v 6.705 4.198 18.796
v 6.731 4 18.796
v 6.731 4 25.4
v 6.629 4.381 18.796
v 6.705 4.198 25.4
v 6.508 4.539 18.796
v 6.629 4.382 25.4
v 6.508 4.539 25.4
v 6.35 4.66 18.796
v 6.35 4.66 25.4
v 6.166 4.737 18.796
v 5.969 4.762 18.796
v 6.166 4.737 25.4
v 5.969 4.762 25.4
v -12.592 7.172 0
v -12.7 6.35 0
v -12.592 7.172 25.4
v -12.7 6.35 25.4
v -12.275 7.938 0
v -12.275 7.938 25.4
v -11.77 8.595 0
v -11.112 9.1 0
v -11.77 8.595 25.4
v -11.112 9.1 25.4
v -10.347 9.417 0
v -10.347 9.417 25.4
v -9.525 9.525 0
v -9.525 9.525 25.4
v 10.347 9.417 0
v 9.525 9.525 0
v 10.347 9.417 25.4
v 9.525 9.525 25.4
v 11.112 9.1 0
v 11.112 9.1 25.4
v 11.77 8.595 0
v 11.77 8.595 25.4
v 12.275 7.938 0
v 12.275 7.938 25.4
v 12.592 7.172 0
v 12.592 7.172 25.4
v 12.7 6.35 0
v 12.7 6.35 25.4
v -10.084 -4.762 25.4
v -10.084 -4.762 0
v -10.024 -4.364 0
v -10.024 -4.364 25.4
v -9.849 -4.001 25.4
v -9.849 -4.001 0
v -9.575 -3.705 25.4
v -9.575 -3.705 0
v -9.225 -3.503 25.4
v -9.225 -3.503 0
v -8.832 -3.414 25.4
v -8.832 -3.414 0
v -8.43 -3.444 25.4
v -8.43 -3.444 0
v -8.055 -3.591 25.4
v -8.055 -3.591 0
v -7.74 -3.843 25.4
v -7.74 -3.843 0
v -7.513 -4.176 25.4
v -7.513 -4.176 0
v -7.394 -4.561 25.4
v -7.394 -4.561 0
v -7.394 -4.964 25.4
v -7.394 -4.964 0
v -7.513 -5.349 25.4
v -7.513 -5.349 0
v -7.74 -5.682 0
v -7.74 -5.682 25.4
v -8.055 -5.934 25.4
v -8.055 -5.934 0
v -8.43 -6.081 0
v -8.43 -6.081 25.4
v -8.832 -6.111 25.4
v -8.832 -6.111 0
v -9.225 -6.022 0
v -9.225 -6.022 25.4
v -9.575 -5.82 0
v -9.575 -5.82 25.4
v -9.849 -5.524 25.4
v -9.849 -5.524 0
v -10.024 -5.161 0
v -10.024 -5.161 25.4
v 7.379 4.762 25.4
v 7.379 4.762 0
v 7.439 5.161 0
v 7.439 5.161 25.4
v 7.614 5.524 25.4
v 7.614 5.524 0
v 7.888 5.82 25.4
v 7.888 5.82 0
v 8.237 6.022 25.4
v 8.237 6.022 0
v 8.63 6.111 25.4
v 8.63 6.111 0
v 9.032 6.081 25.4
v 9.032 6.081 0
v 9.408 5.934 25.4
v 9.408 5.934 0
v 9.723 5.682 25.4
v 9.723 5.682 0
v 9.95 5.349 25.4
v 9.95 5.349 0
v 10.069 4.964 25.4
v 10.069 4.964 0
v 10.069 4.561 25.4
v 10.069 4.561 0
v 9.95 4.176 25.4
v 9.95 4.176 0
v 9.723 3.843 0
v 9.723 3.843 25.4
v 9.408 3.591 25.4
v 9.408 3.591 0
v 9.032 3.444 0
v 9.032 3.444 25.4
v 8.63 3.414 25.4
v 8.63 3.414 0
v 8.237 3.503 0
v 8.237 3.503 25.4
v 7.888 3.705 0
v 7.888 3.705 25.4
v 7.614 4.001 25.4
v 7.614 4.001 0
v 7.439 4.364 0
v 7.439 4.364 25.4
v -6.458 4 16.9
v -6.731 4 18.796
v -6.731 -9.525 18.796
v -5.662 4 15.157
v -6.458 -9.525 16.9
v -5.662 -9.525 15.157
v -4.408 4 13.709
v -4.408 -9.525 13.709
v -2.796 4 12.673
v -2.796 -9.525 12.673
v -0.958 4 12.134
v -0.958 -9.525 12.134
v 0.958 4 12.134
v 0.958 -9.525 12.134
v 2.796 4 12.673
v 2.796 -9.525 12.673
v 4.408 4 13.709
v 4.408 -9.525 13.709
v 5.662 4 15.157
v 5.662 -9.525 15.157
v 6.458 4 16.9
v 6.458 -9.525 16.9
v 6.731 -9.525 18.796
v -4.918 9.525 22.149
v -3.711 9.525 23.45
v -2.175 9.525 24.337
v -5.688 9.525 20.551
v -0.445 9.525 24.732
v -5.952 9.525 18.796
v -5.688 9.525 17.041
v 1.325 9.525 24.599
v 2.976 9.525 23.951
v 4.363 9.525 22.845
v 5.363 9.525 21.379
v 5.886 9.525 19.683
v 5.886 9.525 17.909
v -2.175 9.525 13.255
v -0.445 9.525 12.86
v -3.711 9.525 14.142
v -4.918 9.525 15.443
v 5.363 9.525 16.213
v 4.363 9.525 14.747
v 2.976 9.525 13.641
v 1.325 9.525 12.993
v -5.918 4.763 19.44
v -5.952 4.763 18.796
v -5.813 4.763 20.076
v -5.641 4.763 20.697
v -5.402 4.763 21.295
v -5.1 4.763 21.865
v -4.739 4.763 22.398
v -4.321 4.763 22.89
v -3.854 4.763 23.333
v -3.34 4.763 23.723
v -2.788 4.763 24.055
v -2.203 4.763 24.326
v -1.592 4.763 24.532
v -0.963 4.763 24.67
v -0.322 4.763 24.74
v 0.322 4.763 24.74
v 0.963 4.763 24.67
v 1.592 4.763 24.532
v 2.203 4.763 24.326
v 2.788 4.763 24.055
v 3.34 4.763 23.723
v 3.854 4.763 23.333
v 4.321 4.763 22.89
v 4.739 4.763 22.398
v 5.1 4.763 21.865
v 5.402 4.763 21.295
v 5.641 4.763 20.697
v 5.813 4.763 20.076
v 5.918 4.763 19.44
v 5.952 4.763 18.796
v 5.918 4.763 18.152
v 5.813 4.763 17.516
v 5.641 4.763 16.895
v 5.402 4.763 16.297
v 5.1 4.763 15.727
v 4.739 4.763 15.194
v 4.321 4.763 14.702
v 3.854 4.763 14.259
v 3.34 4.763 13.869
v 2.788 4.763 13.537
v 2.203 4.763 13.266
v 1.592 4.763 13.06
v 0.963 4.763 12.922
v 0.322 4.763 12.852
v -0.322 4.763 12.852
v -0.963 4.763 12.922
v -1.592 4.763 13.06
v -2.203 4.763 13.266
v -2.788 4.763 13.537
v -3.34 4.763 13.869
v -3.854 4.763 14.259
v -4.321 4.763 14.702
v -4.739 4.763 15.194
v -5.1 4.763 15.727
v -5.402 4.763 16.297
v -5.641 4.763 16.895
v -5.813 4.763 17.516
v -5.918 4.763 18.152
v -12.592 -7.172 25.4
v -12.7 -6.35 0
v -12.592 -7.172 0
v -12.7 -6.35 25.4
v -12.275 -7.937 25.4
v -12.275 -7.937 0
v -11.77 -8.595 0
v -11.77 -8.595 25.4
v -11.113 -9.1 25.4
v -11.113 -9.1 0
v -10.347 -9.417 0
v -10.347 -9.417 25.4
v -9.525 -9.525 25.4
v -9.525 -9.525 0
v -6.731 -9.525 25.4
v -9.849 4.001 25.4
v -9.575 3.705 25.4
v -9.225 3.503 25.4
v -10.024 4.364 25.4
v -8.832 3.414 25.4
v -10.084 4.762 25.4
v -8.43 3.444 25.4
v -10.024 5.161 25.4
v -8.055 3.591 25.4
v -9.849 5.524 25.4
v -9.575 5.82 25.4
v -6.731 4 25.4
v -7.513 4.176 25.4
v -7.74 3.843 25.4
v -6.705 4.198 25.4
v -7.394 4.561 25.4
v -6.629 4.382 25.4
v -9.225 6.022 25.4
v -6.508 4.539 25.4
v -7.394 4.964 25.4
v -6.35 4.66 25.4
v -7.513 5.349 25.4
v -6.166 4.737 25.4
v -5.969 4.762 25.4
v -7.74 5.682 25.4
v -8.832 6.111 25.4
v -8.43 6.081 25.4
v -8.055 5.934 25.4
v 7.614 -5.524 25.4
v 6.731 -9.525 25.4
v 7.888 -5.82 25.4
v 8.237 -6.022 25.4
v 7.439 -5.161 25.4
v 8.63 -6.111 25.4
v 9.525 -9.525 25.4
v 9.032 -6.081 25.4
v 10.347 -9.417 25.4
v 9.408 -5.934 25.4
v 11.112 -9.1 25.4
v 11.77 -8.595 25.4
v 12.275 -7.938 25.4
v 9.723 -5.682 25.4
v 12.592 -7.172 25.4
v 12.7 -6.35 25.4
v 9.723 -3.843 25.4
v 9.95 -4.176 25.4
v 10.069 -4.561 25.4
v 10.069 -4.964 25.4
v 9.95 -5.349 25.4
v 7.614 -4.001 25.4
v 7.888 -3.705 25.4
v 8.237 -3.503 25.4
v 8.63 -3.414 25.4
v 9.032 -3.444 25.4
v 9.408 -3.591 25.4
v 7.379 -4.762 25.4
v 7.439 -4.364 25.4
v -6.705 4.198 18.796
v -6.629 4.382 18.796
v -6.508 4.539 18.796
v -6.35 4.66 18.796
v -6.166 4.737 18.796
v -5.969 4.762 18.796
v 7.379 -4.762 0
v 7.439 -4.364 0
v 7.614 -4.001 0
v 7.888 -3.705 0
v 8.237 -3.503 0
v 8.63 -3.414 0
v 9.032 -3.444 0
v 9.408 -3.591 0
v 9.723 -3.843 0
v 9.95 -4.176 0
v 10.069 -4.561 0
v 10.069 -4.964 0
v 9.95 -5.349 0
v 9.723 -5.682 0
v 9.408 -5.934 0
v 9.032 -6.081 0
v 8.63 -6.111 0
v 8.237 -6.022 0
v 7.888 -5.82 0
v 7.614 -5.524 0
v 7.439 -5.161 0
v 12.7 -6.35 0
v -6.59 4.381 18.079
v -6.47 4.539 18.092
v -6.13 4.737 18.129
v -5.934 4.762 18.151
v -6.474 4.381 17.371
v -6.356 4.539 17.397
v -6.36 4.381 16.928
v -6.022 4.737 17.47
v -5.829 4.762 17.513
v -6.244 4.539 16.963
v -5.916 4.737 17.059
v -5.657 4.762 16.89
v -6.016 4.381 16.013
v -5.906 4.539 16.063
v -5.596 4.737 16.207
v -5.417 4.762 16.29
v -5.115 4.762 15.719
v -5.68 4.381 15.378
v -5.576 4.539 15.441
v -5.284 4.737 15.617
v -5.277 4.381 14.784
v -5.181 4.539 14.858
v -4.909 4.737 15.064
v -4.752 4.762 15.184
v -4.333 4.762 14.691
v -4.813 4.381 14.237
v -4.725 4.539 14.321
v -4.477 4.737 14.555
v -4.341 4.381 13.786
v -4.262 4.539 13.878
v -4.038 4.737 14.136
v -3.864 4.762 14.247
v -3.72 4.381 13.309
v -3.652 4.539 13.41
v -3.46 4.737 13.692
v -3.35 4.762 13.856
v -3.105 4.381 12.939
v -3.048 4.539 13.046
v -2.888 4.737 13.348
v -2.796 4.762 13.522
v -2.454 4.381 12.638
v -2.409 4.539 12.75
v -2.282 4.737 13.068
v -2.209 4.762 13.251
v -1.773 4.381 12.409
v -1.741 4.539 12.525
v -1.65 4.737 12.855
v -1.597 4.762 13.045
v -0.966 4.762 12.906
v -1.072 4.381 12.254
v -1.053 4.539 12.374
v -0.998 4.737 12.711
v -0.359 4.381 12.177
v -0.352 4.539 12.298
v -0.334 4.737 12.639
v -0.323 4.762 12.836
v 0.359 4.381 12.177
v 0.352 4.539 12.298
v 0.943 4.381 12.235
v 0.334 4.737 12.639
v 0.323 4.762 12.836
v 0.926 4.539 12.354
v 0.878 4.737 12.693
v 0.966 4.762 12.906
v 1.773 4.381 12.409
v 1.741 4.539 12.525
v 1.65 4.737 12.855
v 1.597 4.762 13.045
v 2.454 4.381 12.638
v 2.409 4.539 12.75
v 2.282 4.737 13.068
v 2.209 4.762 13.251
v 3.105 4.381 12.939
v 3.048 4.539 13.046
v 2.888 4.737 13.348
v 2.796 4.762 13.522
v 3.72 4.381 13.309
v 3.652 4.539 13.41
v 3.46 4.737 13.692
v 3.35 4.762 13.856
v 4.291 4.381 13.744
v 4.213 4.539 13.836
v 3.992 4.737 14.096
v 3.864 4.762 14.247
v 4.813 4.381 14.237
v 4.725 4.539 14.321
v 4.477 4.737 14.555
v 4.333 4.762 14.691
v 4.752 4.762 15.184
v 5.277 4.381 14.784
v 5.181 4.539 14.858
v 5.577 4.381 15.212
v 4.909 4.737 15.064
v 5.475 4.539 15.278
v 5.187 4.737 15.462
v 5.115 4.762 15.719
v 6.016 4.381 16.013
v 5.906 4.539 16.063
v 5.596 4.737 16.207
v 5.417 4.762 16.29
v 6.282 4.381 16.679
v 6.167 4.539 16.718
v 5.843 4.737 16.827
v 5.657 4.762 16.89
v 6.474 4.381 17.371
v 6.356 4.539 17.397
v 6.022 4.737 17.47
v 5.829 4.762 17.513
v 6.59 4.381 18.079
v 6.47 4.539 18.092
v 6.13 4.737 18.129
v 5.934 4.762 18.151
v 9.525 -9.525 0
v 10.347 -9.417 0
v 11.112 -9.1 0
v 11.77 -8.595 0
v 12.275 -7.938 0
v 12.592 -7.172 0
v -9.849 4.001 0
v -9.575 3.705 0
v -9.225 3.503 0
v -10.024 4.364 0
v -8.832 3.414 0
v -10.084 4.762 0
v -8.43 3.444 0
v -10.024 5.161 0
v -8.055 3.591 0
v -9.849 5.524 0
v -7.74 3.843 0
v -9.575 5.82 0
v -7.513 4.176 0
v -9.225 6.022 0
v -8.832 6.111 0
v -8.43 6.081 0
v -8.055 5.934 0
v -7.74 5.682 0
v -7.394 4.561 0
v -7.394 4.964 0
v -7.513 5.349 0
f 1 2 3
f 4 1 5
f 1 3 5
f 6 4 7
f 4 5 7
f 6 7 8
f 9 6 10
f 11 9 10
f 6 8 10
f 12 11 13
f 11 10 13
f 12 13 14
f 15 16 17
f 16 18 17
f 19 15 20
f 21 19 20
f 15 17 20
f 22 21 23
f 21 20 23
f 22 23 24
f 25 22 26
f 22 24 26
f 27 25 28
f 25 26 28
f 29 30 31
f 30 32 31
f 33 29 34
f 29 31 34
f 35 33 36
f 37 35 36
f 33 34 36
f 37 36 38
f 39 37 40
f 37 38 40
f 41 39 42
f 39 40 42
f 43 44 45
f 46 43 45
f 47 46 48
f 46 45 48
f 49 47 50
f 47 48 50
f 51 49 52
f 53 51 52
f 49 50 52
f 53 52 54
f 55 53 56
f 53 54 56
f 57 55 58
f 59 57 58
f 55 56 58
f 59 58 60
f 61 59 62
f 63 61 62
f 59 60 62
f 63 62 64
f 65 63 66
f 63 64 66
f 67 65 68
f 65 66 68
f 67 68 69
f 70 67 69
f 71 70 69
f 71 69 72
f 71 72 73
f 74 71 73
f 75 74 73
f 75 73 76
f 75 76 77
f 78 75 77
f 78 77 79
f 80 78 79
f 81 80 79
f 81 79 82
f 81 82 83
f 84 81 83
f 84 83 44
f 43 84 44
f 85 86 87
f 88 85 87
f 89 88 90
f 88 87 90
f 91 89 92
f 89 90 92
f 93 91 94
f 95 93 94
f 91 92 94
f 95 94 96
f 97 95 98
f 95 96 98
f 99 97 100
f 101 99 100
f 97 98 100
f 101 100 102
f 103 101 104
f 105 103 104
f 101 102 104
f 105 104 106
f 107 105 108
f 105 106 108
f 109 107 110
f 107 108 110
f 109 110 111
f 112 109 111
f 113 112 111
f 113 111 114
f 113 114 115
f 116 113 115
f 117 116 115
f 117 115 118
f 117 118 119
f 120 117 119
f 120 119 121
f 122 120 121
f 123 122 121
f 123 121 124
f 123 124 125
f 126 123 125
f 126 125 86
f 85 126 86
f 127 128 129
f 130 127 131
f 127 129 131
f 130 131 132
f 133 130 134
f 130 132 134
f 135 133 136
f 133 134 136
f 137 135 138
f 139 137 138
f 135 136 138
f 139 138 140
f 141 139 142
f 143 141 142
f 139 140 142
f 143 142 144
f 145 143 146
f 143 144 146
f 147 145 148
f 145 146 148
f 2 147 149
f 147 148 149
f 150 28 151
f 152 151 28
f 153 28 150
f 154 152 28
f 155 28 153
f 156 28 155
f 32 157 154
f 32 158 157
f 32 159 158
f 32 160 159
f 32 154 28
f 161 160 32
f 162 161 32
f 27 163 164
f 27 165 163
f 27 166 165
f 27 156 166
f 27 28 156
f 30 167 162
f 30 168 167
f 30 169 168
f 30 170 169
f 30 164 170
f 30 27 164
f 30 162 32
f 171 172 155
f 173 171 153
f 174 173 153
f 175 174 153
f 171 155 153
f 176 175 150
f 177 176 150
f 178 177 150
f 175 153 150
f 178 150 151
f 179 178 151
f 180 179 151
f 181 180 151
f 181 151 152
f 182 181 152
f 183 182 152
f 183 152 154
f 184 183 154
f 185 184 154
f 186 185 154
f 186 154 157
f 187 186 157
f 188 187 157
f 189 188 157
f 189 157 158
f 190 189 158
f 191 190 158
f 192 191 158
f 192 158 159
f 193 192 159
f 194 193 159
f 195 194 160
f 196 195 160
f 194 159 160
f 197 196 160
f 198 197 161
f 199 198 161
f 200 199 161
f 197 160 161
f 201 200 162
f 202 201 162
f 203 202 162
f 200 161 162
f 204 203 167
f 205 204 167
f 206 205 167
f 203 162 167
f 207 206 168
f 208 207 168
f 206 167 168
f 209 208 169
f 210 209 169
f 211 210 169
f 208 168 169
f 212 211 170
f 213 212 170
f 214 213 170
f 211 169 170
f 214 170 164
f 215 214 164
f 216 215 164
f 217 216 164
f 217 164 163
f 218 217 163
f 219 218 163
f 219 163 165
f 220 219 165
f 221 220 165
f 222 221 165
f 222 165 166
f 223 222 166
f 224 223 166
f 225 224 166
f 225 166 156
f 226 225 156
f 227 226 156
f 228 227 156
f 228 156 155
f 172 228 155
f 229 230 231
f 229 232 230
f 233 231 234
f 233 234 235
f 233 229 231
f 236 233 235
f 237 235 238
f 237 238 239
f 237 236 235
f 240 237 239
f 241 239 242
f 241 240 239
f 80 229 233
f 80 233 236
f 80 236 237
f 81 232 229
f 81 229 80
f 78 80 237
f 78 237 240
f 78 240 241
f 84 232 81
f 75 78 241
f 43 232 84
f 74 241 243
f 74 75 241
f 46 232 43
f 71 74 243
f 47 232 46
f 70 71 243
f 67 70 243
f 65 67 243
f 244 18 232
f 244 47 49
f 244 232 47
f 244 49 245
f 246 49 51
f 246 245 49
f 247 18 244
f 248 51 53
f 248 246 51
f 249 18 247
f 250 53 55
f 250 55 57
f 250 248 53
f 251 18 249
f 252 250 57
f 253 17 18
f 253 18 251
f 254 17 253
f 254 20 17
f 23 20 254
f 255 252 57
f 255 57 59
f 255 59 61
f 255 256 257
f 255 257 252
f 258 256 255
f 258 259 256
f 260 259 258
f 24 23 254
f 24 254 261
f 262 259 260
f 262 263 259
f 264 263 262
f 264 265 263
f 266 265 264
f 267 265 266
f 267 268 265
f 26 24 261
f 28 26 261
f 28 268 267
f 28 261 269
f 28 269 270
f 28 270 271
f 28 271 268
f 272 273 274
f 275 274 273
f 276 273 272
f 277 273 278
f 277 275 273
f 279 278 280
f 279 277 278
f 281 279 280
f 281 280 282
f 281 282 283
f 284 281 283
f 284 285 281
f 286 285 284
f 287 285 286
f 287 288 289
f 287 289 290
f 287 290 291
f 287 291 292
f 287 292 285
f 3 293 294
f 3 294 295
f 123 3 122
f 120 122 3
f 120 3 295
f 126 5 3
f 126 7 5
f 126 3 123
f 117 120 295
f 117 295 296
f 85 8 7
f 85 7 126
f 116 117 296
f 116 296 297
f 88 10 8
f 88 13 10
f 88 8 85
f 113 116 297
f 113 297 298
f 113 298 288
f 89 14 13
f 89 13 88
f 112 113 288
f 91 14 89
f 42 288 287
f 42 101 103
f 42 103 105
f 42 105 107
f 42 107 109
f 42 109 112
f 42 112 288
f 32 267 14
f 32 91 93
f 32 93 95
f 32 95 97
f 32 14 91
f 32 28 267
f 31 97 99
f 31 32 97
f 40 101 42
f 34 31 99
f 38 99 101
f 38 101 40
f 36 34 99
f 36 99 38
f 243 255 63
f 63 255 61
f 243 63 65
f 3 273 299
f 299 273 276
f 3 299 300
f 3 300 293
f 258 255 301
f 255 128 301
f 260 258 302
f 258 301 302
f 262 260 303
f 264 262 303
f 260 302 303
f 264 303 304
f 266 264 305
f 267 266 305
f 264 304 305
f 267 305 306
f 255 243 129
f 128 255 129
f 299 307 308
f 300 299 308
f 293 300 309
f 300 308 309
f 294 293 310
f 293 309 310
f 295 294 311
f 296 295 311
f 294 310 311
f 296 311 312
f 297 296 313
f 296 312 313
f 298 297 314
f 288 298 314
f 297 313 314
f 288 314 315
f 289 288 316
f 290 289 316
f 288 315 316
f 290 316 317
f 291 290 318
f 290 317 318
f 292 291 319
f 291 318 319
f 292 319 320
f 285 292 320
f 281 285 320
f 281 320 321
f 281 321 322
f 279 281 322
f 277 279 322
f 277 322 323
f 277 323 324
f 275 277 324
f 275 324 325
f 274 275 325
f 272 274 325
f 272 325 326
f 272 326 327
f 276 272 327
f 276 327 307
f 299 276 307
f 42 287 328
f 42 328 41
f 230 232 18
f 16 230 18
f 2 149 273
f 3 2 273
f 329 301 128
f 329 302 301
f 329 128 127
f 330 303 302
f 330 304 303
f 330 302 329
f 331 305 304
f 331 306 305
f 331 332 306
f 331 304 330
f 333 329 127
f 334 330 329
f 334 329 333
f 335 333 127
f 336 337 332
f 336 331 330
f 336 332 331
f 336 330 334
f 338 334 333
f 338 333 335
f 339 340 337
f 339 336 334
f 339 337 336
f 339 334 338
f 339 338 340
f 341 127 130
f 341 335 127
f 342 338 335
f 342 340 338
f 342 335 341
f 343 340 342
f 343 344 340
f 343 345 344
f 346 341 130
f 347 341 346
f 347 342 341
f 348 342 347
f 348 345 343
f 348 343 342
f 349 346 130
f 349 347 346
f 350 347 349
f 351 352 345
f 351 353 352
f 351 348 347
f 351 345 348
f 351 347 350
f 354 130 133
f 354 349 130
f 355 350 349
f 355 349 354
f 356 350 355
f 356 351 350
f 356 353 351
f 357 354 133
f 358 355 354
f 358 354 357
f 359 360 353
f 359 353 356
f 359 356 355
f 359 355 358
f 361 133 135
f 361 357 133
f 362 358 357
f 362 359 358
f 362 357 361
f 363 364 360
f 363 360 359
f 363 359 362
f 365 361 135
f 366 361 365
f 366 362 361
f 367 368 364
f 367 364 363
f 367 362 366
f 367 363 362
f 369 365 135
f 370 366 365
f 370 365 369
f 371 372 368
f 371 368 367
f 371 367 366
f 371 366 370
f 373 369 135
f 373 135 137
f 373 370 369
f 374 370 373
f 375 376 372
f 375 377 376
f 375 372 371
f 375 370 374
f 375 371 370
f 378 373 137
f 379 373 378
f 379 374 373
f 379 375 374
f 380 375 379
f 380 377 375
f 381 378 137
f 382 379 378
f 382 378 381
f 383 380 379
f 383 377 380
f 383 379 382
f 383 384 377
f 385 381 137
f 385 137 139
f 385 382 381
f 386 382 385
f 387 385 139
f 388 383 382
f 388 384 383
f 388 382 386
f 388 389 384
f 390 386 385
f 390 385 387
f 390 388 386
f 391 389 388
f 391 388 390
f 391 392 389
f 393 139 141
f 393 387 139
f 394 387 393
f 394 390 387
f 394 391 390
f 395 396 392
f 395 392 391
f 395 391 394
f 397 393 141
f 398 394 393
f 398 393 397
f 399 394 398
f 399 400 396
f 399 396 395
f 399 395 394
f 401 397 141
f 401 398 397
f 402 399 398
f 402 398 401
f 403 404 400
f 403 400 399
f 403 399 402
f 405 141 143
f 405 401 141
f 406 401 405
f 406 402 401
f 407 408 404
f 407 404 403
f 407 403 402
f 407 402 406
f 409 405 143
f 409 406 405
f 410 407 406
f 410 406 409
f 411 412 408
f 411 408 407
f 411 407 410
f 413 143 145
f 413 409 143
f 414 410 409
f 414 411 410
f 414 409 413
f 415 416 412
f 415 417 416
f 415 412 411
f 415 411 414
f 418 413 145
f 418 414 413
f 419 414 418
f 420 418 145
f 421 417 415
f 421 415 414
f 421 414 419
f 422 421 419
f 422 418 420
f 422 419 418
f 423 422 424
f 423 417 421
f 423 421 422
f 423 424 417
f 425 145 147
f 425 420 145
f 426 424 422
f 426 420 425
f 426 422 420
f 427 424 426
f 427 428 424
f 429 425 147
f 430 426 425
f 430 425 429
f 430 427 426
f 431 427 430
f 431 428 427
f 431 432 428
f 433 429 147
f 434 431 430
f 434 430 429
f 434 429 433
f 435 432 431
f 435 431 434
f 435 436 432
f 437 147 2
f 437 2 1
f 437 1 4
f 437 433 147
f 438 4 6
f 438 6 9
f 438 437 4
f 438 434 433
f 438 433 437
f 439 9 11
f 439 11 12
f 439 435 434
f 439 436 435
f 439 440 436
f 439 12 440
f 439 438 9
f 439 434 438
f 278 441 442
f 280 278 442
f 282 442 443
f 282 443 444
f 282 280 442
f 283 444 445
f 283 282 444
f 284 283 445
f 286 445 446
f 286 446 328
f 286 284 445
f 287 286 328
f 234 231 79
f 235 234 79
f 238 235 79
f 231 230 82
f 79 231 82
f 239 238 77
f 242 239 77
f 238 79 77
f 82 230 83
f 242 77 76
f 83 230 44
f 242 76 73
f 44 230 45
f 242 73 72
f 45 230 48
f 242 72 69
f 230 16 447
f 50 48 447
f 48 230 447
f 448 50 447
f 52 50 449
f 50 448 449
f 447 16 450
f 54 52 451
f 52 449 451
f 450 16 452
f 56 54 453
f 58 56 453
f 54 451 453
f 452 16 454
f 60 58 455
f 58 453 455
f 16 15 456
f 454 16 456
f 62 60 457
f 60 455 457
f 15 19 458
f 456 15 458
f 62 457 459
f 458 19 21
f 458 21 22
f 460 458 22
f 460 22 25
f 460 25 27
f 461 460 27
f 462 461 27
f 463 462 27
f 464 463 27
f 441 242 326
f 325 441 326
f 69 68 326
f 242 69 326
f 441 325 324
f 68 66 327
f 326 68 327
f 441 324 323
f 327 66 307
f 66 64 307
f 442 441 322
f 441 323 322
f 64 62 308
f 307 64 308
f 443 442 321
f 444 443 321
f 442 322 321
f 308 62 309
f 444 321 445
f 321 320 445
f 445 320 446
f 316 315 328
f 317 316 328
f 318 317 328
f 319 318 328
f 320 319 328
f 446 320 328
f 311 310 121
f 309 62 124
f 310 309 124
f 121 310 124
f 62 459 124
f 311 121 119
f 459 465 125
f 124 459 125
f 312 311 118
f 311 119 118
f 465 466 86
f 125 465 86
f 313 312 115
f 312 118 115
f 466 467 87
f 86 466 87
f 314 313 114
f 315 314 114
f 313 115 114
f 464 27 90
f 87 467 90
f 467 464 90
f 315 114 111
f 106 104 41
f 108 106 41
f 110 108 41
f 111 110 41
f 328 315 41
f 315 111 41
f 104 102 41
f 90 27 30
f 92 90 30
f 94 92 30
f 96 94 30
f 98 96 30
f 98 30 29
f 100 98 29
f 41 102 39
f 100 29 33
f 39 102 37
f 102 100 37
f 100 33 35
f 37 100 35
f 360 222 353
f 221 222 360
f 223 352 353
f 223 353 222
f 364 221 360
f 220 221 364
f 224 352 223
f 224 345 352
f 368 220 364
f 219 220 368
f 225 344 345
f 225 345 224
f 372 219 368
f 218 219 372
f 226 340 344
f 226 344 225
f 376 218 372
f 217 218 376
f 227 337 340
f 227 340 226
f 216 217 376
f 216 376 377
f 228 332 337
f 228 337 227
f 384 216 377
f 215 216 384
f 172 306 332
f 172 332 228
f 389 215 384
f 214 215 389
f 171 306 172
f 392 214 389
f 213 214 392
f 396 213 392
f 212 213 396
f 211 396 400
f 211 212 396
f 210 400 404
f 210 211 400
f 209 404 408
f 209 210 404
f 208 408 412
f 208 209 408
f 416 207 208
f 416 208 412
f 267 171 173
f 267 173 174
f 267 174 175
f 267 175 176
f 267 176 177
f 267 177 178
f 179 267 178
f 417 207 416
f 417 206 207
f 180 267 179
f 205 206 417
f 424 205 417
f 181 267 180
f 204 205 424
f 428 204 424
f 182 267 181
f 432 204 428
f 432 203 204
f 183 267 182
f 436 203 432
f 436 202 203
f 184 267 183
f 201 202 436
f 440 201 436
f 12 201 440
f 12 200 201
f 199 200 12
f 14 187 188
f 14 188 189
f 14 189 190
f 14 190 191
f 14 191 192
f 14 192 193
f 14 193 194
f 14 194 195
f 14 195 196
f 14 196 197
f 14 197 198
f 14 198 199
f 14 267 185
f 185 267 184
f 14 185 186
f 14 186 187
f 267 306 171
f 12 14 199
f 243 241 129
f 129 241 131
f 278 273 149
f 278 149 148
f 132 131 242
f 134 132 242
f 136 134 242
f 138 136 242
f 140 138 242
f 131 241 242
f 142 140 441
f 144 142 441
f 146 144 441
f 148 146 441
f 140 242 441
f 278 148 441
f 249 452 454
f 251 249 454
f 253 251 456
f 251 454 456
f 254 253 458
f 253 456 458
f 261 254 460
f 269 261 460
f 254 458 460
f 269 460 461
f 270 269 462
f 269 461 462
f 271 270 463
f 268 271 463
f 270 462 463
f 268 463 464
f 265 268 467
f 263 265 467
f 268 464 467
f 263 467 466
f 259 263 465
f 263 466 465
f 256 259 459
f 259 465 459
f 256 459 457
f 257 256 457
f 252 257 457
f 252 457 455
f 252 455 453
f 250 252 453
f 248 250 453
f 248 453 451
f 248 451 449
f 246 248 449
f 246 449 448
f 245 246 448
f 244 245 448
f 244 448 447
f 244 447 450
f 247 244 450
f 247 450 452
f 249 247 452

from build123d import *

# Parameters (mm, degrees)
F0_W     = 25.4
F0_H     = 19.05
F1_DEPTH = 25.4
F3_DEPTH = 14.2875
F5_D     = 2.7051
F7_D     = 11.90498
F8_R     = 3.175
F9_R     = 0.762


with BuildPart() as f1:
    # F0 (on Top) → F1 (new body)
    with BuildSketch(Plane.XY):
        Rectangle(F0_W, F0_H)
    extrude(amount=F1_DEPTH)

    # F2 (on face) → F3 (cut)
    with BuildSketch(Plane.XZ.offset(9.525)):
        with BuildLine():
            Line((6.731, 25.4), (-6.731, 25.4))
            Line((-6.731, 25.4), (-6.731, 18.796))
            ThreePointArc((-6.731, 18.796), (0, 12.065), (6.731, 18.796))
            Line((6.731, 18.796), (6.731, 25.4))
        make_face()
    extrude(amount=-F3_DEPTH, mode=Mode.SUBTRACT)

    # F5 (through all)
    with Locations(Plane.XY.offset(25.4)):
        with Locations((-8.73125, 4.7625), (-8.73125, -4.7625), (8.73125, 4.7625), (8.73125, -4.7625)):
            Hole(F5_D / 2)

    # F7 (through all)
    with Locations(Plane.XZ.offset(-4.7625)):
        with Locations((0, 18.796)):
            Hole(F7_D / 2)

    # F8
    f8_edges = [f1.edges().sort_by_distance(p)[0] for p in [
        (-12.7, -9.525, 12.7),
        (12.7, -9.525, 12.7),
        (12.7, 9.525, 12.7),
        (-12.7, 9.525, 12.7),
    ]]
    fillet(f8_edges, radius=F8_R)

    # F9
    f9_edges = [f1.edges().sort_by_distance(p)[0] for p in [
        (-6.731, 4.7625, 22.098),
        (0, 4.7625, 12.065),
        (6.731, 4.7625, 22.098),
    ]]
    fillet(f9_edges, radius=F9_R)


solid = f1.part
